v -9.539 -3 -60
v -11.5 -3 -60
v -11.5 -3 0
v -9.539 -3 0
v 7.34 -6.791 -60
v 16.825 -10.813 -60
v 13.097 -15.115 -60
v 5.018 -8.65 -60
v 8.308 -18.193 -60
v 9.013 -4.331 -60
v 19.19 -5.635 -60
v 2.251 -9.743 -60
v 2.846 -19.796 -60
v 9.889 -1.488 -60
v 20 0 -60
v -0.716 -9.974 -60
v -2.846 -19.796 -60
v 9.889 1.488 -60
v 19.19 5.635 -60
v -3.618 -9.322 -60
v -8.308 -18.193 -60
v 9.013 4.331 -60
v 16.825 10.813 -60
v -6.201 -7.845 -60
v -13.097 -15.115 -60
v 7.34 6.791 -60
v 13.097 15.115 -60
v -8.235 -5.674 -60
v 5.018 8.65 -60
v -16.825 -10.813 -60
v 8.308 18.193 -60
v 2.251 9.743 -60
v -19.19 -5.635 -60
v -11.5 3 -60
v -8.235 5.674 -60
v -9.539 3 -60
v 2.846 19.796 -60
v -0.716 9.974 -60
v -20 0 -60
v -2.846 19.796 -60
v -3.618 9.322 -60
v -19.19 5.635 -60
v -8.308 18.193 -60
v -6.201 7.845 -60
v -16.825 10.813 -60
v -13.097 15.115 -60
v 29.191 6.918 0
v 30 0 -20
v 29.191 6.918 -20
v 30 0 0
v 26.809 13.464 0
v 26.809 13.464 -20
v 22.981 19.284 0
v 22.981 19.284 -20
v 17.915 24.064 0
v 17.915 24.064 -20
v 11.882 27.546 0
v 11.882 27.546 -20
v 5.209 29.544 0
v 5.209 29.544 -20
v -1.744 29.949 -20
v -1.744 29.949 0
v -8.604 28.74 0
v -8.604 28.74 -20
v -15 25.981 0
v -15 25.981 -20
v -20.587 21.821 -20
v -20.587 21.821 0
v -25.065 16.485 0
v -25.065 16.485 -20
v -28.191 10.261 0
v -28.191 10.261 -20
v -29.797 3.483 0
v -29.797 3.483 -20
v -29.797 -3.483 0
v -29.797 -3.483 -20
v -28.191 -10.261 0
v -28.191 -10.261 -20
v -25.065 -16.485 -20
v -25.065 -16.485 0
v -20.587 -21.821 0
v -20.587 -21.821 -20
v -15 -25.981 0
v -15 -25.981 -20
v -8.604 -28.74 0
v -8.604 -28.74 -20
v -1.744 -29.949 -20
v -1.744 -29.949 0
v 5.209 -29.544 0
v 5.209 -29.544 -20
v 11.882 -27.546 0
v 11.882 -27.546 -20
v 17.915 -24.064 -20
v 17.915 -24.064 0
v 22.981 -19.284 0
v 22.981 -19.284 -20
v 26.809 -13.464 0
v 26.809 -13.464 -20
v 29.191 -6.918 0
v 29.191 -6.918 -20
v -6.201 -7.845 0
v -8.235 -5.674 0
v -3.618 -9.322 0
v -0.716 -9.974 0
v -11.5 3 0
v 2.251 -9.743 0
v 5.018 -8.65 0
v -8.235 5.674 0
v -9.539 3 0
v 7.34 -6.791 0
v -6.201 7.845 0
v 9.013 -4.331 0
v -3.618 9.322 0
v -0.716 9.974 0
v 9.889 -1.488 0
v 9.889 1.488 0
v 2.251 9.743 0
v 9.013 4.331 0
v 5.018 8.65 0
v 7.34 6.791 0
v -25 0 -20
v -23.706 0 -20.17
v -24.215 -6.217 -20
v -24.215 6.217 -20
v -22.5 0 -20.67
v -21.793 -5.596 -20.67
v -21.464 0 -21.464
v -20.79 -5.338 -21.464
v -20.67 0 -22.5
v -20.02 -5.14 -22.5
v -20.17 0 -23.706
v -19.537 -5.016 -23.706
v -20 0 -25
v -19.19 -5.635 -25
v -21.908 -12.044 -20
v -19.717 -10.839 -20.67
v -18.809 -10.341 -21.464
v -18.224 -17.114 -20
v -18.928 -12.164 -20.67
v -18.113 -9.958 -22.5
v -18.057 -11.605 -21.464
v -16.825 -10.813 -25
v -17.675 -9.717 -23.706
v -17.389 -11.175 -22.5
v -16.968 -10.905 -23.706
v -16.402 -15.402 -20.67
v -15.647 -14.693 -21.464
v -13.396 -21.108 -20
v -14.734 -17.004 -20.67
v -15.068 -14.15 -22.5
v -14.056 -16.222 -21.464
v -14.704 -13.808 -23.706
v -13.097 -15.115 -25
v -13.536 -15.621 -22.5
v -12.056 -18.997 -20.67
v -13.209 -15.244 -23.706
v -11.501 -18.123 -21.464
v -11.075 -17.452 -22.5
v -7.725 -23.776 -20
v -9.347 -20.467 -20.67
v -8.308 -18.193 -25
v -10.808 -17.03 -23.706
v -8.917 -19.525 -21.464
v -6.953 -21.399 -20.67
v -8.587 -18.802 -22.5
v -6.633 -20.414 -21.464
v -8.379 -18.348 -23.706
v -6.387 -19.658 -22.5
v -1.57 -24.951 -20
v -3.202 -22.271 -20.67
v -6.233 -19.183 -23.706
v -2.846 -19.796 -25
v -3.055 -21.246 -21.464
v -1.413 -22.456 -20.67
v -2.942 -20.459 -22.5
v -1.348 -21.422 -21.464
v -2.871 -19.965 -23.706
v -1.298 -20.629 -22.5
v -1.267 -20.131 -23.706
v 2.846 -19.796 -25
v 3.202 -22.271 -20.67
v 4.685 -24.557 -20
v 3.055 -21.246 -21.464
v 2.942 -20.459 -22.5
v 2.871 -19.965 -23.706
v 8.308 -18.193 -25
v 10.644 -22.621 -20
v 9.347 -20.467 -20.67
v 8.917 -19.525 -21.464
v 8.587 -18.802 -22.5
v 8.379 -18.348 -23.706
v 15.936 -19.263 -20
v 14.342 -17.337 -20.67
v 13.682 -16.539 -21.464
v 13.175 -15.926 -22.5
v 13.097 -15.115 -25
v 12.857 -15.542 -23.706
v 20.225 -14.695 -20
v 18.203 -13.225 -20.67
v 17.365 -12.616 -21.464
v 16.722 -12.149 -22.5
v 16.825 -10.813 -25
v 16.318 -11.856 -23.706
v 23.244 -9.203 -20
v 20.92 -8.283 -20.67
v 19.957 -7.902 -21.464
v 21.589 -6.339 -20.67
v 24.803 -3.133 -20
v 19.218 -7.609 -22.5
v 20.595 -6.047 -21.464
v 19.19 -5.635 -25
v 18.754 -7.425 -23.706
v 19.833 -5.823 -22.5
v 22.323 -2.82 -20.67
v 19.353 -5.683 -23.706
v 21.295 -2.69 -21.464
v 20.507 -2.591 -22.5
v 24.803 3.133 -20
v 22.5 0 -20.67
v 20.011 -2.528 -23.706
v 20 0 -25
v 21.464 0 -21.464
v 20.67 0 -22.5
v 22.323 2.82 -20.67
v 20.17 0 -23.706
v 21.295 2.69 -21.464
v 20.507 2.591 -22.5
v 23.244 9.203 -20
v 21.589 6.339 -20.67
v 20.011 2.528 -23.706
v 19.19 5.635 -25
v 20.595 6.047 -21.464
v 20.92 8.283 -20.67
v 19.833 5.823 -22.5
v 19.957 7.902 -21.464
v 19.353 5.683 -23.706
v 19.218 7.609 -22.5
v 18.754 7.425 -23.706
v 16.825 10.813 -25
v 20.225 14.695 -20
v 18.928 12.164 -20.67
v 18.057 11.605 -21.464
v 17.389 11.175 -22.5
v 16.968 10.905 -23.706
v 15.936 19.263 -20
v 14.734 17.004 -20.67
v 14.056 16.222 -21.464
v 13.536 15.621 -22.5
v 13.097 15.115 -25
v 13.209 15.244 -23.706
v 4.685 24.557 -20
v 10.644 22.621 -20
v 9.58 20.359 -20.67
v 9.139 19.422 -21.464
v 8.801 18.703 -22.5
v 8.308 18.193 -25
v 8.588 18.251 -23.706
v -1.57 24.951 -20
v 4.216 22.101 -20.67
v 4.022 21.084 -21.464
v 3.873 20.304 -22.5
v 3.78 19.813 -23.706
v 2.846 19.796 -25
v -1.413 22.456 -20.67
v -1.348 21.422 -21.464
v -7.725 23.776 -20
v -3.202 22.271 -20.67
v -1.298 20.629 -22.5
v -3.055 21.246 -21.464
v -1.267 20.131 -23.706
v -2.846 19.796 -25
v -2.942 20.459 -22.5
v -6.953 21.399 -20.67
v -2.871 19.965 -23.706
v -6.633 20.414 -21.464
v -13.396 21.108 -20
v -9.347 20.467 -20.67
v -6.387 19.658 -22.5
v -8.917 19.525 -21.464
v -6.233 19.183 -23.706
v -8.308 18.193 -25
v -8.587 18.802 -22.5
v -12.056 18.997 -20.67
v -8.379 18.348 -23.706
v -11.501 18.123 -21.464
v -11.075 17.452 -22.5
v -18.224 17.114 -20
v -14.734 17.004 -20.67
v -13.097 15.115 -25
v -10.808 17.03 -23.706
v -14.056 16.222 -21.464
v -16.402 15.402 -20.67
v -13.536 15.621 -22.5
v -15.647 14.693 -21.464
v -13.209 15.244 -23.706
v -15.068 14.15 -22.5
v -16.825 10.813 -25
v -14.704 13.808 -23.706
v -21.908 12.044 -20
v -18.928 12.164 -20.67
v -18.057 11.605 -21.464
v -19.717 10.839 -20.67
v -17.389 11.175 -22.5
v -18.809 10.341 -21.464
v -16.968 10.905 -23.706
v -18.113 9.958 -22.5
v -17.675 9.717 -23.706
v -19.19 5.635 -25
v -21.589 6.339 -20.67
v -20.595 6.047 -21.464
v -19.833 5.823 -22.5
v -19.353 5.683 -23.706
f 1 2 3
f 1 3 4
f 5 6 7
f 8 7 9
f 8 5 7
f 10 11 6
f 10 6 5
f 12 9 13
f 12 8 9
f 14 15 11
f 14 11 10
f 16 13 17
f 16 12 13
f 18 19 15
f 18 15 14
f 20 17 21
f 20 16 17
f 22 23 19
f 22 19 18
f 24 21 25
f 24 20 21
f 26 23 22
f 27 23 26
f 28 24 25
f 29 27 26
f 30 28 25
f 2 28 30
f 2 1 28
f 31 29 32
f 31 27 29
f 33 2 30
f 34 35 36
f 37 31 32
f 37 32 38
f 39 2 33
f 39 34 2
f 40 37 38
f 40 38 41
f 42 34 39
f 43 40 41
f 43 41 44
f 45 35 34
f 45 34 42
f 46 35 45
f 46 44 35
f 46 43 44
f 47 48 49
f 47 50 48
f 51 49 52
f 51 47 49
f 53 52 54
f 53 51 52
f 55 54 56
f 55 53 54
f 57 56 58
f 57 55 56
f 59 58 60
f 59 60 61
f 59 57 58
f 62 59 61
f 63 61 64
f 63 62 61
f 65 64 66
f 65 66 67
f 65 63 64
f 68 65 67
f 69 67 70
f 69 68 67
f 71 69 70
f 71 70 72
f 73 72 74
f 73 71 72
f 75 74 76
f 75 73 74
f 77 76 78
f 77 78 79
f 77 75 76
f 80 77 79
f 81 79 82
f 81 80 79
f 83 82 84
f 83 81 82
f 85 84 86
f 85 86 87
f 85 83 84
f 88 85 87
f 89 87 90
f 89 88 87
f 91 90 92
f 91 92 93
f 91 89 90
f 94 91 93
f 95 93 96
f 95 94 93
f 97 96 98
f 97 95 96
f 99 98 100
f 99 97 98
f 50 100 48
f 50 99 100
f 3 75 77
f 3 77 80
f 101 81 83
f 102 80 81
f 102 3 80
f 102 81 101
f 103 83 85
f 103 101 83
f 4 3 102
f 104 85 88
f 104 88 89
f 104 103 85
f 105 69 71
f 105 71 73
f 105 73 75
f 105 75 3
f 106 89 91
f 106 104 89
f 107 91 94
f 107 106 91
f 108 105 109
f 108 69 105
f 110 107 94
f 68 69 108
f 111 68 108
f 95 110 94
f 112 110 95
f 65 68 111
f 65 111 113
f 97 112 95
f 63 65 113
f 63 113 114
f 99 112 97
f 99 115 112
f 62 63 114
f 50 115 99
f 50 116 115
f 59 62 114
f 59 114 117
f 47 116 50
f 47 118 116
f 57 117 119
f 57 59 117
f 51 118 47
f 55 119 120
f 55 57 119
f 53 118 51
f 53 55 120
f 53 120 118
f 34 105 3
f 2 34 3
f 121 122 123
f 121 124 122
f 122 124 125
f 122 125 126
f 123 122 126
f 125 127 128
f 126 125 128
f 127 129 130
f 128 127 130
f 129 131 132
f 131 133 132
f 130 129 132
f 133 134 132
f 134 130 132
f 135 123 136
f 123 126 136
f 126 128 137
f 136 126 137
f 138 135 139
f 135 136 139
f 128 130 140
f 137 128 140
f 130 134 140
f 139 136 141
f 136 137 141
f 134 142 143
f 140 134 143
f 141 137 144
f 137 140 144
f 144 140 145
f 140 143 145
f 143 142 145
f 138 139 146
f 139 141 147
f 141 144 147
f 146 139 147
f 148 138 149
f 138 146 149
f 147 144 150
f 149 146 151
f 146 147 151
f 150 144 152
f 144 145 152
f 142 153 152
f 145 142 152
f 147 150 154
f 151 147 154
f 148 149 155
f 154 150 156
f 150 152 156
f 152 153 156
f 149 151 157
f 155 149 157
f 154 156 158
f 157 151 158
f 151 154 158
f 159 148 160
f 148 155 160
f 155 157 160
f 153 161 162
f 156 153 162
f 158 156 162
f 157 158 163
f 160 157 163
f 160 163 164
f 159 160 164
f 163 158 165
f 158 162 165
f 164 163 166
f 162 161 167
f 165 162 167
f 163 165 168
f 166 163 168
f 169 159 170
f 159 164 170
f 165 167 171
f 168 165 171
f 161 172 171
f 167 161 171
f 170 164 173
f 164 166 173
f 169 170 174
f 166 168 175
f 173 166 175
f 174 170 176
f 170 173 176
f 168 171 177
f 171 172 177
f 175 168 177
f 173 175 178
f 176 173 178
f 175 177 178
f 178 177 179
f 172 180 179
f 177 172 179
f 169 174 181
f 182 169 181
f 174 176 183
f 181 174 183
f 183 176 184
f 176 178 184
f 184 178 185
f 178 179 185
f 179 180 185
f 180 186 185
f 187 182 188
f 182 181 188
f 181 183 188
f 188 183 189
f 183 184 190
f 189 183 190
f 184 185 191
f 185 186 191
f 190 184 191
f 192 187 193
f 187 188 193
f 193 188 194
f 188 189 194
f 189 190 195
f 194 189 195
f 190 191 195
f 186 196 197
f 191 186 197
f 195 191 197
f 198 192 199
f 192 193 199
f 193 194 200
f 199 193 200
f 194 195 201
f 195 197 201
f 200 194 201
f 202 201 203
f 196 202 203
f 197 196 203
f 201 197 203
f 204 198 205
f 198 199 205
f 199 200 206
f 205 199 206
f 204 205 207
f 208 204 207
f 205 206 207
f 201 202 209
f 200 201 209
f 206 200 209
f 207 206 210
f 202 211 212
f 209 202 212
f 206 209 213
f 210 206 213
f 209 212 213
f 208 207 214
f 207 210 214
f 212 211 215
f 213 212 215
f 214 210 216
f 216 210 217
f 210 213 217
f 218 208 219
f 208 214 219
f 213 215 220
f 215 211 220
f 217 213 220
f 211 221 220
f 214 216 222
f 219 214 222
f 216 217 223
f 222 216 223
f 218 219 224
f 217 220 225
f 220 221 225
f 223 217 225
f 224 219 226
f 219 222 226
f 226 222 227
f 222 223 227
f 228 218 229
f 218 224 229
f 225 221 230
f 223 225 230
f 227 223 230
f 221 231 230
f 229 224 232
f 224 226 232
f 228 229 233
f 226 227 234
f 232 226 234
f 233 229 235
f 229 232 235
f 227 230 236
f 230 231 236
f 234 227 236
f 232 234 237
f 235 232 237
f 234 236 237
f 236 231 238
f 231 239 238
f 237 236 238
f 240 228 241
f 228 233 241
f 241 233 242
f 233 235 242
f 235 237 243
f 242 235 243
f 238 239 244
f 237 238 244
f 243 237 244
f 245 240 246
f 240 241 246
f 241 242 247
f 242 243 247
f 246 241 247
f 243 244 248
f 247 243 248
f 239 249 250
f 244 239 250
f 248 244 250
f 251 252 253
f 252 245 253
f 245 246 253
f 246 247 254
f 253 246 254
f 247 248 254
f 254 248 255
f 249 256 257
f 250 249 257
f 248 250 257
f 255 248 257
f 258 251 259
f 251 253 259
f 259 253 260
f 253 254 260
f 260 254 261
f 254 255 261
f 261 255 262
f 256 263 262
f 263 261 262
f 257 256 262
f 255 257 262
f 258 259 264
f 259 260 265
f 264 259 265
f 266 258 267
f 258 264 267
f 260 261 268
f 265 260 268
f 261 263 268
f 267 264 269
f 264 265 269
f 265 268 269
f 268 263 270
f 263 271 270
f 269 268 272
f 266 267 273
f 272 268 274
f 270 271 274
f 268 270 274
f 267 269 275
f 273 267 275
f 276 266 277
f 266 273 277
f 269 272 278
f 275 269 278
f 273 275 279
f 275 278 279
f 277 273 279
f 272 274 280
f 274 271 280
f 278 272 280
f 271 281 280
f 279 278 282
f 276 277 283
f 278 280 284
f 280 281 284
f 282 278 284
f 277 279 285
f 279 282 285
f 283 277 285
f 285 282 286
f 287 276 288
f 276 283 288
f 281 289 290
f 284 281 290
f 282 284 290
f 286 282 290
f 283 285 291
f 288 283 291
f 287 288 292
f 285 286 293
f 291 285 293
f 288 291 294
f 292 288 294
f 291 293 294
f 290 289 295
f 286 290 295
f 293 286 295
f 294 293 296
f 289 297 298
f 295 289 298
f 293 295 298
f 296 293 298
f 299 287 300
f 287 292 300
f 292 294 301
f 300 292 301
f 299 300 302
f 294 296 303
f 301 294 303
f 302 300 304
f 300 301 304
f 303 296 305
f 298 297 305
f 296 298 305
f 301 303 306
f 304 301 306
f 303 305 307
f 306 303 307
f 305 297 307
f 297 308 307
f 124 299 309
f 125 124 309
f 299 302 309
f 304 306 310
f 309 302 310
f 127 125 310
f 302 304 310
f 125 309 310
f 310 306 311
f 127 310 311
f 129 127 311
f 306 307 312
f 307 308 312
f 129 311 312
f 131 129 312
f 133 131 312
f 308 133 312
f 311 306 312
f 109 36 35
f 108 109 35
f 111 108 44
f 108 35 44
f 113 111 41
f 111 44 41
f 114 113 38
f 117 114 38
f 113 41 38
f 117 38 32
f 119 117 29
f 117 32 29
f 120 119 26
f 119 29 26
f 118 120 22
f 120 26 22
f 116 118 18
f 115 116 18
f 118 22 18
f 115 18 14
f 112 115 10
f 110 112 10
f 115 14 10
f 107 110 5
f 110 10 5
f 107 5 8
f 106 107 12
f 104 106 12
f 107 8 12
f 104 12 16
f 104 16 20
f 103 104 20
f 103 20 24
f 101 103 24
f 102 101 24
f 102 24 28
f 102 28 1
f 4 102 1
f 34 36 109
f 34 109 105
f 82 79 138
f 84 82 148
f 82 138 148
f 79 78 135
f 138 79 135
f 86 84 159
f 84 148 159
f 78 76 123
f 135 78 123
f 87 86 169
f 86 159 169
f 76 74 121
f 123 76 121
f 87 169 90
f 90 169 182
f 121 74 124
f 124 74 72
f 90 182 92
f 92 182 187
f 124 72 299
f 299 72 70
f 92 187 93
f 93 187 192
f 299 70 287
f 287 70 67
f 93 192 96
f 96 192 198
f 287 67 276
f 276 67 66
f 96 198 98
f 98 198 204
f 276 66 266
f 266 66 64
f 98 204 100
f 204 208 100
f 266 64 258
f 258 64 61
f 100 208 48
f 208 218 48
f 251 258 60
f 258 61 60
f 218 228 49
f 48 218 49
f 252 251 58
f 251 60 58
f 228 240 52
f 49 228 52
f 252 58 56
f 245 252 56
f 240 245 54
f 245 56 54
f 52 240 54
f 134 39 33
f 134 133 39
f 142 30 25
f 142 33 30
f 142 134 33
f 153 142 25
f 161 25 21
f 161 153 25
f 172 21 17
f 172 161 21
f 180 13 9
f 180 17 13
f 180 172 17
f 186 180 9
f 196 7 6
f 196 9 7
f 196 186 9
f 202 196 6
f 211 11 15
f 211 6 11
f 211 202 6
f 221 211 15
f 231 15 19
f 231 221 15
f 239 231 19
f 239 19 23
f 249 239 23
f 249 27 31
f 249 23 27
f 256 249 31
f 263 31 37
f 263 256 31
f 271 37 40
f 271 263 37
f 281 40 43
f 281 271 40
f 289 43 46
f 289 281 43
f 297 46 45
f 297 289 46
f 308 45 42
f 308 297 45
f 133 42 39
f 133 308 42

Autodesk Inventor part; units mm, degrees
ref_plane "YZ Plane" through (0, 0, 0) normal (1, 0, 0) x (0, 1, 0)
ref_plane "XZ Plane" through (0, 0, 0) normal (0, 1, 0) x (-1, 0, 0)
ref_plane "XY Plane" through (0, 0, 0) normal (0, 0, 1) x (1, 0, 0)
sketch "Эскиз1" plane through (0, 0, 0) normal (0, 0, 1) x (1, 0, 0)
  circle A0 centre (0, 0) radius 30
  dimension "d0" = 60
extrude "Выдавливание1" add sketch "Эскиз1" against normal blind 20
sketch "Эскиз2" plane through (0, 0, -20) normal (0, 0, -1) x (-1, 0, 0)
  circle A0 centre (0, 0) radius 30 projected
  circle A1 centre (0, 0) radius 20
  dimension "d3" = 40
extrude "Выдавливание2" add sketch "Эскиз2" along normal blind 40 contours A1
sketch "Эскиз3" plane through (0, 0, -60) normal (0, 0, -1) x (-1, 0, 0)
  circle A0 centre (0, 0) radius 20 projected
  arc A1 (9.5394, 3) -> (9.5394, -3) centre (0, 0) ccw
  line L0 (9.5394, 3) -> (11.5, 3)
  line L1 (11.5, 3) -> (11.5, -3)
  line L2 (11.5, -3) -> (9.5394, -3)
  dimension "d6" = 20
  dimension "d8" = 11.5
  dimension "d9" = 3
  dimension "d10" = 3
extrude "Выдавливание3" cut sketch "Эскиз3" against normal through all contours L0 L1 L2 A1
fillet "Сопряжение2" radius 5 1 edges at (20, 0, -20)
properties part number "Колесо"
